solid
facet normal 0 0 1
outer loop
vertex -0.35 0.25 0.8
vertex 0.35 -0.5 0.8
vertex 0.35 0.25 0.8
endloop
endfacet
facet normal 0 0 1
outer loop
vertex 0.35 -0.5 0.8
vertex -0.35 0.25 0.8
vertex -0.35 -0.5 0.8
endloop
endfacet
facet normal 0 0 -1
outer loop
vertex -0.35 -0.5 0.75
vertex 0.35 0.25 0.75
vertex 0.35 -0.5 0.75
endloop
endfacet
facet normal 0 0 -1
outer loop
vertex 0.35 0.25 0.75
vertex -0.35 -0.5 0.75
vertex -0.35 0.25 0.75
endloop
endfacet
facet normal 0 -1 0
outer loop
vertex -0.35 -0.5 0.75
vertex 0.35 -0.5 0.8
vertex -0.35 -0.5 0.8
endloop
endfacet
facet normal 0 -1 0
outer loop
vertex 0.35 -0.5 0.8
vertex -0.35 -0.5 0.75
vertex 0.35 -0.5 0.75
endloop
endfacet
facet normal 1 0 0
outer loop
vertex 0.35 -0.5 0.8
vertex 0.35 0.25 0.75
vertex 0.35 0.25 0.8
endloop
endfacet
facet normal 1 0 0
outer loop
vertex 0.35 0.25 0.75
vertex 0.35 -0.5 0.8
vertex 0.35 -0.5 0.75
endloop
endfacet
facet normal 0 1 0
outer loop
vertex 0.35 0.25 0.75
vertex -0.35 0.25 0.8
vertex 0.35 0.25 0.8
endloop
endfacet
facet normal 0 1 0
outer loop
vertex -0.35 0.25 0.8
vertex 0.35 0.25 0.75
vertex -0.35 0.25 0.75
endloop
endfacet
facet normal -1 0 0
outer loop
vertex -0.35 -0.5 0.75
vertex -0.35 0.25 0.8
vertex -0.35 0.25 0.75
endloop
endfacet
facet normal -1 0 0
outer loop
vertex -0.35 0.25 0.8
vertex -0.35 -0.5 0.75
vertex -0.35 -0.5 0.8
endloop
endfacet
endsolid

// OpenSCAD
$fn = 100;

//scale([0.01, 0.01, 0.01]) keg();
//scale([0.01, 0.01, 0.01]) 
//mug();


//keg();
//kegRack();
//kegBand();
kegerator();
//referenceCube();


height = 70;
width = 100;

module kegRack() {
    // first shelf
    //translate([30, 29, 57]) rotate([-90, 90, 90]) keg();
    //translate([30, 29, 57]) rotate([-90, 90, 90]) kegBand();
    //translate([30, -23, 61]) rotate([-90, 90, 90]) keg();
    //translate([30, -23, 61]) rotate([-90, 90, 90]) kegBand();
    
    // middle shelf
    //translate([30, 29, 121]) rotate([-90, 90, 90]) keg();
    //translate([30, 29, 121]) rotate([-90, 90, 90]) kegBand();
    //translate([30, -23, 124]) rotate([-90, 90, 90]) keg();
    //translate([30, -23, 124]) rotate([-90, 90, 90]) kegBand();
    
    // top shelf
    //translate([30, 29, 185]) rotate([-90, 90, 90]) keg();
    //translate([30, 29, 185]) rotate([-90, 90, 90]) kegBand();
    
    // bottom shelf
    translate([-50, -50, 35])
    union() {
        rotate([-5, 0, 0])      cube([100, 100, 2]);
        translate([0, 100, -6]) cube([100, 2, 15]);
    }
    
    // middle shelf
    translate([-50, -50, 100])
    union() {
        rotate([-5, 0, 0])      cube([100, 100, 2]);
        translate([0, 100, -6]) cube([100, 2, 15]);
    }
    
    // top shelf
    translate([-50, -50, 165])
    union() {
        rotate([-5, 0, 0])      cube([100, 100, 2]);
        translate([0, 100, -6])  cube([100, 2, 15]);
    }
    
    // legs
    translate([-50, -50, 0])
    cylinder(d=5, 200);
    translate([-50, 50, 0])
    cylinder(d=5, 200);
    translate([50, -50, 0])
    cylinder(d=5, 200);
    translate([50, 50, 0])
    cylinder(d=5, 200);
    
}

module mug() {
    //mugGlass();
    //mugContents();
    //mugFoam();
    translate([10, 0, 30])
    sphere(d=20);
}

module mugGlass() {
    scale([0.6, 0.6, 0.6])
    union() {
    difference() {
        cylinder(d=40, h=50, $fn=50);
        translate([0, 0, 5])
        cylinder(d=35, h=55, $fn=50);
    }
    
    translate([-29, -2.5, 10])
    difference() {
        cube([10, 5, 30]);
        translate([4.01, -.05, 4])
        cube([7, 6, 22]);
    }
}
}

module mugContents() {
    scale([0.6, 0.6, 0.6])
    color("brown")
    translate([0, 0, 5])
    cylinder(d=34.5, h=40, $fn=50);
}

module mugFoam() {
    color("white")
    scale([0.6, 0.6, 0.6])
    union() {
        
        translate([0, 0, 44])
        cylinder(d=34.75, h=6, $fn=50);
        
        translate([0, 0, 50])
        cylinder(d=40, h=1, $fn=50);
        
        difference() {
            translate([0, 0, 0])
            cylinder(d=41, h=51, $fn=50);
            
            translate([0, 0, -0.5])
            cylinder(d=40, h=52, $fn=50);
            
            
            translate([35, 0, 10])
            sphere(d=75);
            
            
            translate([-34, 10, 10])
            sphere(d=80);
        }
        
    }
}

module kegBand() {
    color("red")
    translate([0, 0, 22])
    cylinder(r=25.2, h=15);
}

module keg() {
    //cylinder(r=25, h=50);
    cylinder(r1=24, r2=25, h=12);
    
    translate([0, 0, 12])
    hull() {
        cylinder(r=25, h=10);
        translate([0, 0, 5])
        cylinder(r=26, h=1);
    }
    
    translate([0, 0, 22])
    cylinder(r=25, h=15);
    
    translate([0, 0, 37])
    hull() {
        cylinder(r=25, h=10);
        translate([0, 0, 5])
        cylinder(r=26, h=1);
    }
    
    translate([0, 0, 45])
    difference() {
        cylinder(r=25, h=15);
        
        translate([0, 0, 5.01])
        cylinder(r=23, h=10);
        
        translate([-7.5, -50, 7])
        cube([15, 100, 5]);
    }
    
    cylinder(d=10, h=55);
}

module kegerator() {
    //translate([0, -10, 5]) keg();
    
    //kegDoorFrameClosed();
    //kegDoorGlassClosed();
    
    //kegDoorFrameOpen();
    //kegDoorGlassOpen();
    scale([0.01, 0.01, 0.01])
    //kegBase();
    //tapColumn();
    //tapLabel();
    kegeratorTop();
}

module kegeratorTop() {
    translate([-70/2, -50, height+5])
    union() {
        cube([70, 75, 5]);
    }
}


module kegBase() {
    translate([-70/2, -50, 0])
    difference() {
        cube([70, 70, height+5]);
        
        translate([2.5, 3, 7.5])
        cube([65, 100, height - 5]);
    }
}

module kegDoorGlassOpen() {
    translate([-4, 13, 0])
    rotate([0, 0, -15])
    kegDoorGlass();
}

module kegDoorFrameOpen() {
    translate([-4, 13, 0])
    rotate([0, 0, -15])
    kegDoorFrame();
}

module kegDoorGlassClosed() {
    kegDoorGlass();
}

module kegDoorFrameClosed() {
    kegDoorFrame();
}

module kegDoorFrame() {
    difference() {
        translate([-width/2, 20, 0])
        cube([width, 2.5, height]);
        
        kegDoorGlass();
    }
}

module kegDoorGlass() {
    translate([-width/2+15/2, 20-0.001, 15/2])
    cube([width-15, 2.7, height-15]);
}

module tapColumn() {
    translate([0, -15, height+5])
    cylinder(d=7, h=35, $fn=30);
    
    translate([-5/2, -15, height+35])
    cube([5, 15, 5]);
}

module tapLabel() {
    translate([-15/2, -18, height+35])
    cube([15, 2.5, 30]);
}

module referenceCube() {
    translate([-50, -200, 0])
    cube([100, 100, 100]);
}
